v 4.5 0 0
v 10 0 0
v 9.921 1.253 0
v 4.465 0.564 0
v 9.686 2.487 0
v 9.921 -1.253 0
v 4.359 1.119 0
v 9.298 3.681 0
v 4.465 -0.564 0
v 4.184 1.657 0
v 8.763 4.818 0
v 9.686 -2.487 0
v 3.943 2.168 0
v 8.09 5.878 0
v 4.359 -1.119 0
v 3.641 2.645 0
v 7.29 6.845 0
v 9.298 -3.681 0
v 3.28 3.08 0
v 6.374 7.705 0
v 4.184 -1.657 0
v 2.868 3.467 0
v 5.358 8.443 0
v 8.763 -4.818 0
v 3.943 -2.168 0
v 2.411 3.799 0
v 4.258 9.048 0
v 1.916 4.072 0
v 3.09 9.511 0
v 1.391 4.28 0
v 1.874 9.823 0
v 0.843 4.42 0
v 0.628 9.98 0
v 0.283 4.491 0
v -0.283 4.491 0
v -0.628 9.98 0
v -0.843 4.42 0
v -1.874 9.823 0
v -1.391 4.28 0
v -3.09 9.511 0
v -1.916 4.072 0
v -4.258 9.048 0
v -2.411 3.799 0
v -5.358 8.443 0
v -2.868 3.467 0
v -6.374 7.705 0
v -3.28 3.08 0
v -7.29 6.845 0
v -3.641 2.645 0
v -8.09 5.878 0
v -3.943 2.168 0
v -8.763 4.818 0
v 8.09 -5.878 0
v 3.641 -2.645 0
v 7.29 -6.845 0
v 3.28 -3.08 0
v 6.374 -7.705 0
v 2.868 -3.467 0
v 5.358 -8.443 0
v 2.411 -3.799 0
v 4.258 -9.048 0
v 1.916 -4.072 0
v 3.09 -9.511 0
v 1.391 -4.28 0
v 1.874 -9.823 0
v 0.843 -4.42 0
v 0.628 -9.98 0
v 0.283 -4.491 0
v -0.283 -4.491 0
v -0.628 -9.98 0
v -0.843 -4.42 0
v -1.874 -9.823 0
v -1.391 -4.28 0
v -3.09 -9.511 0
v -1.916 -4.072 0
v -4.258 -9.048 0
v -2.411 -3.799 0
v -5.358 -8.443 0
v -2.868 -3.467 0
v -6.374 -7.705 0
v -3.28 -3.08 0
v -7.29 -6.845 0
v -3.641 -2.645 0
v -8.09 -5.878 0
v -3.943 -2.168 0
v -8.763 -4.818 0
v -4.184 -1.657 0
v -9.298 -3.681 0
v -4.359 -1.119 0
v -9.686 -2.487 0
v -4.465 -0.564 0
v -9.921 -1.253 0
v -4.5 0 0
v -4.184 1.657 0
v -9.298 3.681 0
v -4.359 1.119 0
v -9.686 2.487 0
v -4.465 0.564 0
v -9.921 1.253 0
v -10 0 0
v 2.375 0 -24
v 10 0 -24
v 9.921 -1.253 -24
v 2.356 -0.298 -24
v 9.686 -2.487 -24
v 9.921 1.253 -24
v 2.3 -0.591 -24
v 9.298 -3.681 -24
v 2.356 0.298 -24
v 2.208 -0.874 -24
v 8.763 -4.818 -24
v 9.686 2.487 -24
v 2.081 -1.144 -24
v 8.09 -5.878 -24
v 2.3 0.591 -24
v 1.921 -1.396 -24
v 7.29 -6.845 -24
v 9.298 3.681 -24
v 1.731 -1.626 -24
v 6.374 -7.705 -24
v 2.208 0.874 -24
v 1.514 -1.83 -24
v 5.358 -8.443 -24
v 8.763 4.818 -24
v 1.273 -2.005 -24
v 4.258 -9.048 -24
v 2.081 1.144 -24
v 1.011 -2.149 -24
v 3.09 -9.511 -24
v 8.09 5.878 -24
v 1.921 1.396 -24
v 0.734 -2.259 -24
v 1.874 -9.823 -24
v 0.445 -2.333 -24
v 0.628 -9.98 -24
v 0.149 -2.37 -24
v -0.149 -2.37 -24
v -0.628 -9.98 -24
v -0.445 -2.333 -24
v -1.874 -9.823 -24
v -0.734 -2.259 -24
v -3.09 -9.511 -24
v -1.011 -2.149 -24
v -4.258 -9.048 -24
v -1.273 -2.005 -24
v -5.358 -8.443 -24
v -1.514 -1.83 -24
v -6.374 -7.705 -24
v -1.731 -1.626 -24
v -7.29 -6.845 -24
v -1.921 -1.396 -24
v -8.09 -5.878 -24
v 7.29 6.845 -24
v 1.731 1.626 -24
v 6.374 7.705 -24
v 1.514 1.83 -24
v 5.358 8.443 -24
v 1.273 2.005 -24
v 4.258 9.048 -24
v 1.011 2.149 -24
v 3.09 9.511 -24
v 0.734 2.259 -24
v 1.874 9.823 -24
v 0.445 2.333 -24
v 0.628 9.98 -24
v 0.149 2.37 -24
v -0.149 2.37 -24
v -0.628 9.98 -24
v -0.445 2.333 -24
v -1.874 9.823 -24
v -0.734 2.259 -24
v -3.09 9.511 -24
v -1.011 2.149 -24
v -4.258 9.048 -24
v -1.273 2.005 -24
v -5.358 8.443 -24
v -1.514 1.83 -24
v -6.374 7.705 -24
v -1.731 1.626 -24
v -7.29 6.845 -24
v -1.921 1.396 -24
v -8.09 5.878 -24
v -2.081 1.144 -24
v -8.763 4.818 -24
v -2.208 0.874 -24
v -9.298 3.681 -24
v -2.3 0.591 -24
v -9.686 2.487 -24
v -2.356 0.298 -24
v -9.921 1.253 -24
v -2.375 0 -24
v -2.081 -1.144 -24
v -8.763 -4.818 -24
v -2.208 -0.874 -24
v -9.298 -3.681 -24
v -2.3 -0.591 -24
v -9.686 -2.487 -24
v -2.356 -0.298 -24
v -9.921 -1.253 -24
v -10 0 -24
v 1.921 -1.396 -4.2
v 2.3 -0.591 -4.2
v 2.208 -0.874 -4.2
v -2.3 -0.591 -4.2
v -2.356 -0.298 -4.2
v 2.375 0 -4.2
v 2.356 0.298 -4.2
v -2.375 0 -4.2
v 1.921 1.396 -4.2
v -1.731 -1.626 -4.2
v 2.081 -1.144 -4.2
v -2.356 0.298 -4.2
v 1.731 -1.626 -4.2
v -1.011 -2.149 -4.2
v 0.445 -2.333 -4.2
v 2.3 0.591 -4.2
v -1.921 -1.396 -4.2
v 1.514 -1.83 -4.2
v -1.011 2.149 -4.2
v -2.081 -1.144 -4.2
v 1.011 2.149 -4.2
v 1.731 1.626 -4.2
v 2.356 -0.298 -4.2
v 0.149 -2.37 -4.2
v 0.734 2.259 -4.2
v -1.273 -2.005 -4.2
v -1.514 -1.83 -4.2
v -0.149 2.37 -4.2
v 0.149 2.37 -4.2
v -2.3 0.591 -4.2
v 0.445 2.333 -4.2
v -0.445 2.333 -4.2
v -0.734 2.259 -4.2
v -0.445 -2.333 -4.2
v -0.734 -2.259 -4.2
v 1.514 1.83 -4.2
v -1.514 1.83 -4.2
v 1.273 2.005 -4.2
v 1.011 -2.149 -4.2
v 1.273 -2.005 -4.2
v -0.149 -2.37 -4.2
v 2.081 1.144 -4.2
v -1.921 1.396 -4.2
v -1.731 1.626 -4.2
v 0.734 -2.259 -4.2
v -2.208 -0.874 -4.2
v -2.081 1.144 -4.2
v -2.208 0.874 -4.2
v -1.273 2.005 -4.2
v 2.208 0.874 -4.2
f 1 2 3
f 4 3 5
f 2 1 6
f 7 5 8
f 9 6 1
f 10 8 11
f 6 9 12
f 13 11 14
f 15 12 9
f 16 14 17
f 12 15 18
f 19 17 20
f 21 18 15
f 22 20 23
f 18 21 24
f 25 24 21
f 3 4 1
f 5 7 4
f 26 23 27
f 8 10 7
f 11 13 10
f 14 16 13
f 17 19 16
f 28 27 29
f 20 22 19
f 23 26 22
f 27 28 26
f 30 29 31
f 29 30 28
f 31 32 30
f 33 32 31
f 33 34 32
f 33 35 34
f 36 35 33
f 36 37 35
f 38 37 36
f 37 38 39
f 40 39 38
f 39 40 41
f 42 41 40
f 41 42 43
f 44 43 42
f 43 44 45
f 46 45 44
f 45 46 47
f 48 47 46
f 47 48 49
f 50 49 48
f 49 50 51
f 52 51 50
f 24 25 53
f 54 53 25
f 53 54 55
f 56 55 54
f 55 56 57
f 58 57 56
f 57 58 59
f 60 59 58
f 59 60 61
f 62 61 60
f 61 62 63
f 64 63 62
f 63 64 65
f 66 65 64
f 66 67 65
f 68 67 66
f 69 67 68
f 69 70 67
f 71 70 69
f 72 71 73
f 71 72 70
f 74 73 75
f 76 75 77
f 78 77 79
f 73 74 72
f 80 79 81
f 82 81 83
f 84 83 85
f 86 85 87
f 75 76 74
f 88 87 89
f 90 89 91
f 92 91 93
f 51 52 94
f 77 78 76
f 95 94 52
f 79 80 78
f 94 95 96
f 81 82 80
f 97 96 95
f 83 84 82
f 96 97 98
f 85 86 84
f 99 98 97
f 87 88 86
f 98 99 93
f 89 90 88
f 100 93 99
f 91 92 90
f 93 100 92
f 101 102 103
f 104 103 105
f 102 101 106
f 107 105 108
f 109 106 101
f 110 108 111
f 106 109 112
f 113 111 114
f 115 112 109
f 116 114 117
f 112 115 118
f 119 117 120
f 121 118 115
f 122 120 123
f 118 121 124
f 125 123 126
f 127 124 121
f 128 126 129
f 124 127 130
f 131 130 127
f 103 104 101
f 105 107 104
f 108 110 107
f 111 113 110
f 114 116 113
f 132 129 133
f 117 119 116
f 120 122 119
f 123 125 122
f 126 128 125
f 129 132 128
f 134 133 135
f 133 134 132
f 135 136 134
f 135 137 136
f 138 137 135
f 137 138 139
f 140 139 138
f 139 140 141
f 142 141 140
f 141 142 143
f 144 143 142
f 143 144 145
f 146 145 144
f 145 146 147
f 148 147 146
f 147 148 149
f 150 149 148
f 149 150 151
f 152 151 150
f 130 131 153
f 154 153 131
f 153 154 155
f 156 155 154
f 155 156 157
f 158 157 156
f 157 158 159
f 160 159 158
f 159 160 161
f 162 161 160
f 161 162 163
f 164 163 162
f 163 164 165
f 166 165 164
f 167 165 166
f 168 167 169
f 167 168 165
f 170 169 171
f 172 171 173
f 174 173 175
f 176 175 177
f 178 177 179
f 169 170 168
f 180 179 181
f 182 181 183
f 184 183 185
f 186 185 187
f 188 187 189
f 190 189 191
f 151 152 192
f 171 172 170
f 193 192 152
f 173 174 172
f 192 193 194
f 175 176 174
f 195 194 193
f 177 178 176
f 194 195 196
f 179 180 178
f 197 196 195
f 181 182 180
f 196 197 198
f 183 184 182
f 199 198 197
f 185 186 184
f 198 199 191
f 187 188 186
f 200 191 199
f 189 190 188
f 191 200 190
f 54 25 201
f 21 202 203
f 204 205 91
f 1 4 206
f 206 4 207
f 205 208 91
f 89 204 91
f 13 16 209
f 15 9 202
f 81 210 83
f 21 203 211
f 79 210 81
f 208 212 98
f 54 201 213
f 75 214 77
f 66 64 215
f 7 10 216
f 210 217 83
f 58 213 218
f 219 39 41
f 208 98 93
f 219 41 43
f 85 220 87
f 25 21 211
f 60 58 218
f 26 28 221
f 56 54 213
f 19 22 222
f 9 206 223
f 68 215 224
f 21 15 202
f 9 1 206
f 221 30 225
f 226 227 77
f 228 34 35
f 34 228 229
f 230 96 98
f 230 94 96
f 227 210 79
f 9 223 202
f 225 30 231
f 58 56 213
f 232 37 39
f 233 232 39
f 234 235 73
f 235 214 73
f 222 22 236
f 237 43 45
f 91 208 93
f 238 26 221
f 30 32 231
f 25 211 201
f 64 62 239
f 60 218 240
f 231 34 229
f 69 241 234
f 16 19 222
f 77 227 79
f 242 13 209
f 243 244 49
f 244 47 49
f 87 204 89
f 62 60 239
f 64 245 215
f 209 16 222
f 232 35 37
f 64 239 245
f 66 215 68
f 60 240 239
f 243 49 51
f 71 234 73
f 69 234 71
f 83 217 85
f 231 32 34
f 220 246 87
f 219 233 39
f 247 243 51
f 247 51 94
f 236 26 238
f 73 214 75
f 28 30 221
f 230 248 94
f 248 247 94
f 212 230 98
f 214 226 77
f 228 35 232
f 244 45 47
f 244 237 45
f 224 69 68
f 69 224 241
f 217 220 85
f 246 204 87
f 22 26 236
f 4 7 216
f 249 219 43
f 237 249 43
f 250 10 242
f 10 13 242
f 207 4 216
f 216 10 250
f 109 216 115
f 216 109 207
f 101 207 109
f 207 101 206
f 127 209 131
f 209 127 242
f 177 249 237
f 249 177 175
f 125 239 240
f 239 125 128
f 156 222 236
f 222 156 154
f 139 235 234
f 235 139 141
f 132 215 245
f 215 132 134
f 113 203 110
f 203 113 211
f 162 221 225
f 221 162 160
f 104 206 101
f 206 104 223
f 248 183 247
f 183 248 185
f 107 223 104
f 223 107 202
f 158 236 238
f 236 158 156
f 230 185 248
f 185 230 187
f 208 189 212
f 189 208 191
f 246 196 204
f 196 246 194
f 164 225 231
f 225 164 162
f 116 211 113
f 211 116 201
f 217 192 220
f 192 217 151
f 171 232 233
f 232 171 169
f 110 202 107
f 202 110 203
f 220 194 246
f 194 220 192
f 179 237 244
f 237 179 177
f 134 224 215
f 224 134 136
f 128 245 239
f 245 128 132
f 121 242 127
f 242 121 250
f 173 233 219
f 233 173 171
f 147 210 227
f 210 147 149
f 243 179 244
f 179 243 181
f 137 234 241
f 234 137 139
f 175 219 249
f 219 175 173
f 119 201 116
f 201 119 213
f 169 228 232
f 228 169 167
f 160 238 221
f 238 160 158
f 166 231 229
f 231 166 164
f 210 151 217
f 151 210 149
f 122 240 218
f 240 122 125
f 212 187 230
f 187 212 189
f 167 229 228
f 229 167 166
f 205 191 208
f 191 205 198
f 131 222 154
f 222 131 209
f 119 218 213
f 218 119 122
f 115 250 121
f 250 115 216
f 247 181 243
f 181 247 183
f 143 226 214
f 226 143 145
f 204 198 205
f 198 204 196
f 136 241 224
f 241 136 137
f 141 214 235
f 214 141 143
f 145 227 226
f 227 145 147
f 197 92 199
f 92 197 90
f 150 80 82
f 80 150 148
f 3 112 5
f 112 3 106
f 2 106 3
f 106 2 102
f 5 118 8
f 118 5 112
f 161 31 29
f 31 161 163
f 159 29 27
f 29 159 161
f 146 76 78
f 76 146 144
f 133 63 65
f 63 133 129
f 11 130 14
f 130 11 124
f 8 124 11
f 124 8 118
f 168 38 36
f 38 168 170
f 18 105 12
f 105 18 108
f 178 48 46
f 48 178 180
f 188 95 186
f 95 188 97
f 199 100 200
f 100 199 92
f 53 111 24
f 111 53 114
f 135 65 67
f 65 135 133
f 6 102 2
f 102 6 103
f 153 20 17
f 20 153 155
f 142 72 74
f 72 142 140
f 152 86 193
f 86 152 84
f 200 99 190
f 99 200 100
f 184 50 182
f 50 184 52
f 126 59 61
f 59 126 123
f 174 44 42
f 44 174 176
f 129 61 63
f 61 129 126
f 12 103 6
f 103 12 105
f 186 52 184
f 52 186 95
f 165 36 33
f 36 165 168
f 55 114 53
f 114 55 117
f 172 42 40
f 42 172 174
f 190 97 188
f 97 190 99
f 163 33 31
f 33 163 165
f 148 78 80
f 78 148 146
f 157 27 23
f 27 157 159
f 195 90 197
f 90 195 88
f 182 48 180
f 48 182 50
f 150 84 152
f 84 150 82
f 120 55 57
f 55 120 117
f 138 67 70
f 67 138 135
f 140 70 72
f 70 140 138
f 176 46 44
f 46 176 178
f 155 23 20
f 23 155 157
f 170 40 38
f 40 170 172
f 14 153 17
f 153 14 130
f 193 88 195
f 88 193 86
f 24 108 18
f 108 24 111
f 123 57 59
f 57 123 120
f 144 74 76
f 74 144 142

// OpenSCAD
$fn = 50;


difference() {
	union() {
		translate(v = [0, 0, -24.0000000000]) {
			cylinder(h = 24, r = 10.0000000000);
		}
	}
	union() {
		translate(v = [0, 0, 0]) {
			rotate(a = [0, 0, 0]) {
				difference() {
					union() {
						#translate(v = [0, 0, -24.0000000000]) {
							cylinder(h = 24, r = 2.2500000000);
						}
						#translate(v = [0, 0, -4.2000000000]) {
							cylinder(h = 4.2000000000, r1 = 2.3750000000, r2 = 4.5000000000);
						}
						#translate(v = [0, 0, -24.0000000000]) {
							cylinder(h = 24, r = 2.3750000000);
						}
						#translate(v = [0, 0, -24.0000000000]) {
							cylinder(h = 24, r = 2.2500000000);
						}
					}
					union();
				}
			}
		}
	}
}
